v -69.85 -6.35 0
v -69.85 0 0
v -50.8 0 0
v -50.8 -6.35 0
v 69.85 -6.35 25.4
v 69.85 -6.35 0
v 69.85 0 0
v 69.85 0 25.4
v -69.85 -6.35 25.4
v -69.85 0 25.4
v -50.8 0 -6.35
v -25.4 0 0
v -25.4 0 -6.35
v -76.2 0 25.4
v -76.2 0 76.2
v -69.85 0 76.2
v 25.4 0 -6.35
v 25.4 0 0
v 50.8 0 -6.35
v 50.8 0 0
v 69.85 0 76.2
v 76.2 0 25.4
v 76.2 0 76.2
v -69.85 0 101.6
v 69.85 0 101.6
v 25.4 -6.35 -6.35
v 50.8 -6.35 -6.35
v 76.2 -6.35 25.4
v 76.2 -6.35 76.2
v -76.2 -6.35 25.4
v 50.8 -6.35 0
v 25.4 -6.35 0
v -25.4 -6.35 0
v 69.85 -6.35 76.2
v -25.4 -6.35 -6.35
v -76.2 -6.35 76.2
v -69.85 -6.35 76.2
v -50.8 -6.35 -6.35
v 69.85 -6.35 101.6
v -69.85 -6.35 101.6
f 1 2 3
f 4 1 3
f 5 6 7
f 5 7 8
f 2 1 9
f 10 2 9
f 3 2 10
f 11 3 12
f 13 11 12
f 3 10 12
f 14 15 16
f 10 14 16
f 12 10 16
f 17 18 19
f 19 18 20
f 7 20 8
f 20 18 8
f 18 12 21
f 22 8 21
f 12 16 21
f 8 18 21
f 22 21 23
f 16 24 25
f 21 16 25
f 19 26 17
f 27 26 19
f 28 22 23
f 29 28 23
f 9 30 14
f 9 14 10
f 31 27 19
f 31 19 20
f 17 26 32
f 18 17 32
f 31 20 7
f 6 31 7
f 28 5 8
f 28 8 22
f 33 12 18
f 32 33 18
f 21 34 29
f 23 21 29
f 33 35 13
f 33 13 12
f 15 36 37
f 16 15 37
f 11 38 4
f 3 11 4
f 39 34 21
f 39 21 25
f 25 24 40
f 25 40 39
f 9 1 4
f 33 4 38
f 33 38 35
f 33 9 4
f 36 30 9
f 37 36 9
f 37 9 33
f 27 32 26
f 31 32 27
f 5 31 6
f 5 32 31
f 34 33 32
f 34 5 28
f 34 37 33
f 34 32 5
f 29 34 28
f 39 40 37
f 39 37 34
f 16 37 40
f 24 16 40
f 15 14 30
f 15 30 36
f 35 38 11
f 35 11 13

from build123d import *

# Parameters (mm, degrees)
F0_W     = 152.4
F0_H     = 101.6
F1_DEPTH = 6.35
F2_W     = 25.4
F2_H     = 6.35
F3_DEPTH = 6.35
F4_W     = 6.35
F4_H     = 25.4
F5_DEPTH = 25.4


with BuildPart() as f1:
    # F0 (on Front) → F1 (new body)
    with BuildSketch(Plane.XZ):
        with Locations((0, 50.8)):
            Rectangle(F0_W, F0_H)
    extrude(amount=F1_DEPTH)

    # F2 (on face) → F3 (join)
    with BuildSketch(Plane.XZ.offset(6.35)):
        with Locations((38.1, -3.175)):
            Rectangle(F2_W, F2_H)
        with Locations((-38.1, -3.175)):
            Rectangle(F2_W, F2_H)
    extrude(amount=-F3_DEPTH)

    # F4 (on face) → F5 (cut)
    with BuildSketch(Plane.XZ.offset(6.35)):
        with Locations((73.025, 88.9)):
            Rectangle(F4_W, F4_H)
        with Locations((73.025, 12.7)):
            Rectangle(F4_W, F4_H)
        with Locations((-73.025, 12.7)):
            Rectangle(F4_W, F4_H)
        with Locations((-73.025, 88.9)):
            Rectangle(F4_W, F4_H)
    extrude(amount=-F5_DEPTH, mode=Mode.SUBTRACT)


solid = f1.part
